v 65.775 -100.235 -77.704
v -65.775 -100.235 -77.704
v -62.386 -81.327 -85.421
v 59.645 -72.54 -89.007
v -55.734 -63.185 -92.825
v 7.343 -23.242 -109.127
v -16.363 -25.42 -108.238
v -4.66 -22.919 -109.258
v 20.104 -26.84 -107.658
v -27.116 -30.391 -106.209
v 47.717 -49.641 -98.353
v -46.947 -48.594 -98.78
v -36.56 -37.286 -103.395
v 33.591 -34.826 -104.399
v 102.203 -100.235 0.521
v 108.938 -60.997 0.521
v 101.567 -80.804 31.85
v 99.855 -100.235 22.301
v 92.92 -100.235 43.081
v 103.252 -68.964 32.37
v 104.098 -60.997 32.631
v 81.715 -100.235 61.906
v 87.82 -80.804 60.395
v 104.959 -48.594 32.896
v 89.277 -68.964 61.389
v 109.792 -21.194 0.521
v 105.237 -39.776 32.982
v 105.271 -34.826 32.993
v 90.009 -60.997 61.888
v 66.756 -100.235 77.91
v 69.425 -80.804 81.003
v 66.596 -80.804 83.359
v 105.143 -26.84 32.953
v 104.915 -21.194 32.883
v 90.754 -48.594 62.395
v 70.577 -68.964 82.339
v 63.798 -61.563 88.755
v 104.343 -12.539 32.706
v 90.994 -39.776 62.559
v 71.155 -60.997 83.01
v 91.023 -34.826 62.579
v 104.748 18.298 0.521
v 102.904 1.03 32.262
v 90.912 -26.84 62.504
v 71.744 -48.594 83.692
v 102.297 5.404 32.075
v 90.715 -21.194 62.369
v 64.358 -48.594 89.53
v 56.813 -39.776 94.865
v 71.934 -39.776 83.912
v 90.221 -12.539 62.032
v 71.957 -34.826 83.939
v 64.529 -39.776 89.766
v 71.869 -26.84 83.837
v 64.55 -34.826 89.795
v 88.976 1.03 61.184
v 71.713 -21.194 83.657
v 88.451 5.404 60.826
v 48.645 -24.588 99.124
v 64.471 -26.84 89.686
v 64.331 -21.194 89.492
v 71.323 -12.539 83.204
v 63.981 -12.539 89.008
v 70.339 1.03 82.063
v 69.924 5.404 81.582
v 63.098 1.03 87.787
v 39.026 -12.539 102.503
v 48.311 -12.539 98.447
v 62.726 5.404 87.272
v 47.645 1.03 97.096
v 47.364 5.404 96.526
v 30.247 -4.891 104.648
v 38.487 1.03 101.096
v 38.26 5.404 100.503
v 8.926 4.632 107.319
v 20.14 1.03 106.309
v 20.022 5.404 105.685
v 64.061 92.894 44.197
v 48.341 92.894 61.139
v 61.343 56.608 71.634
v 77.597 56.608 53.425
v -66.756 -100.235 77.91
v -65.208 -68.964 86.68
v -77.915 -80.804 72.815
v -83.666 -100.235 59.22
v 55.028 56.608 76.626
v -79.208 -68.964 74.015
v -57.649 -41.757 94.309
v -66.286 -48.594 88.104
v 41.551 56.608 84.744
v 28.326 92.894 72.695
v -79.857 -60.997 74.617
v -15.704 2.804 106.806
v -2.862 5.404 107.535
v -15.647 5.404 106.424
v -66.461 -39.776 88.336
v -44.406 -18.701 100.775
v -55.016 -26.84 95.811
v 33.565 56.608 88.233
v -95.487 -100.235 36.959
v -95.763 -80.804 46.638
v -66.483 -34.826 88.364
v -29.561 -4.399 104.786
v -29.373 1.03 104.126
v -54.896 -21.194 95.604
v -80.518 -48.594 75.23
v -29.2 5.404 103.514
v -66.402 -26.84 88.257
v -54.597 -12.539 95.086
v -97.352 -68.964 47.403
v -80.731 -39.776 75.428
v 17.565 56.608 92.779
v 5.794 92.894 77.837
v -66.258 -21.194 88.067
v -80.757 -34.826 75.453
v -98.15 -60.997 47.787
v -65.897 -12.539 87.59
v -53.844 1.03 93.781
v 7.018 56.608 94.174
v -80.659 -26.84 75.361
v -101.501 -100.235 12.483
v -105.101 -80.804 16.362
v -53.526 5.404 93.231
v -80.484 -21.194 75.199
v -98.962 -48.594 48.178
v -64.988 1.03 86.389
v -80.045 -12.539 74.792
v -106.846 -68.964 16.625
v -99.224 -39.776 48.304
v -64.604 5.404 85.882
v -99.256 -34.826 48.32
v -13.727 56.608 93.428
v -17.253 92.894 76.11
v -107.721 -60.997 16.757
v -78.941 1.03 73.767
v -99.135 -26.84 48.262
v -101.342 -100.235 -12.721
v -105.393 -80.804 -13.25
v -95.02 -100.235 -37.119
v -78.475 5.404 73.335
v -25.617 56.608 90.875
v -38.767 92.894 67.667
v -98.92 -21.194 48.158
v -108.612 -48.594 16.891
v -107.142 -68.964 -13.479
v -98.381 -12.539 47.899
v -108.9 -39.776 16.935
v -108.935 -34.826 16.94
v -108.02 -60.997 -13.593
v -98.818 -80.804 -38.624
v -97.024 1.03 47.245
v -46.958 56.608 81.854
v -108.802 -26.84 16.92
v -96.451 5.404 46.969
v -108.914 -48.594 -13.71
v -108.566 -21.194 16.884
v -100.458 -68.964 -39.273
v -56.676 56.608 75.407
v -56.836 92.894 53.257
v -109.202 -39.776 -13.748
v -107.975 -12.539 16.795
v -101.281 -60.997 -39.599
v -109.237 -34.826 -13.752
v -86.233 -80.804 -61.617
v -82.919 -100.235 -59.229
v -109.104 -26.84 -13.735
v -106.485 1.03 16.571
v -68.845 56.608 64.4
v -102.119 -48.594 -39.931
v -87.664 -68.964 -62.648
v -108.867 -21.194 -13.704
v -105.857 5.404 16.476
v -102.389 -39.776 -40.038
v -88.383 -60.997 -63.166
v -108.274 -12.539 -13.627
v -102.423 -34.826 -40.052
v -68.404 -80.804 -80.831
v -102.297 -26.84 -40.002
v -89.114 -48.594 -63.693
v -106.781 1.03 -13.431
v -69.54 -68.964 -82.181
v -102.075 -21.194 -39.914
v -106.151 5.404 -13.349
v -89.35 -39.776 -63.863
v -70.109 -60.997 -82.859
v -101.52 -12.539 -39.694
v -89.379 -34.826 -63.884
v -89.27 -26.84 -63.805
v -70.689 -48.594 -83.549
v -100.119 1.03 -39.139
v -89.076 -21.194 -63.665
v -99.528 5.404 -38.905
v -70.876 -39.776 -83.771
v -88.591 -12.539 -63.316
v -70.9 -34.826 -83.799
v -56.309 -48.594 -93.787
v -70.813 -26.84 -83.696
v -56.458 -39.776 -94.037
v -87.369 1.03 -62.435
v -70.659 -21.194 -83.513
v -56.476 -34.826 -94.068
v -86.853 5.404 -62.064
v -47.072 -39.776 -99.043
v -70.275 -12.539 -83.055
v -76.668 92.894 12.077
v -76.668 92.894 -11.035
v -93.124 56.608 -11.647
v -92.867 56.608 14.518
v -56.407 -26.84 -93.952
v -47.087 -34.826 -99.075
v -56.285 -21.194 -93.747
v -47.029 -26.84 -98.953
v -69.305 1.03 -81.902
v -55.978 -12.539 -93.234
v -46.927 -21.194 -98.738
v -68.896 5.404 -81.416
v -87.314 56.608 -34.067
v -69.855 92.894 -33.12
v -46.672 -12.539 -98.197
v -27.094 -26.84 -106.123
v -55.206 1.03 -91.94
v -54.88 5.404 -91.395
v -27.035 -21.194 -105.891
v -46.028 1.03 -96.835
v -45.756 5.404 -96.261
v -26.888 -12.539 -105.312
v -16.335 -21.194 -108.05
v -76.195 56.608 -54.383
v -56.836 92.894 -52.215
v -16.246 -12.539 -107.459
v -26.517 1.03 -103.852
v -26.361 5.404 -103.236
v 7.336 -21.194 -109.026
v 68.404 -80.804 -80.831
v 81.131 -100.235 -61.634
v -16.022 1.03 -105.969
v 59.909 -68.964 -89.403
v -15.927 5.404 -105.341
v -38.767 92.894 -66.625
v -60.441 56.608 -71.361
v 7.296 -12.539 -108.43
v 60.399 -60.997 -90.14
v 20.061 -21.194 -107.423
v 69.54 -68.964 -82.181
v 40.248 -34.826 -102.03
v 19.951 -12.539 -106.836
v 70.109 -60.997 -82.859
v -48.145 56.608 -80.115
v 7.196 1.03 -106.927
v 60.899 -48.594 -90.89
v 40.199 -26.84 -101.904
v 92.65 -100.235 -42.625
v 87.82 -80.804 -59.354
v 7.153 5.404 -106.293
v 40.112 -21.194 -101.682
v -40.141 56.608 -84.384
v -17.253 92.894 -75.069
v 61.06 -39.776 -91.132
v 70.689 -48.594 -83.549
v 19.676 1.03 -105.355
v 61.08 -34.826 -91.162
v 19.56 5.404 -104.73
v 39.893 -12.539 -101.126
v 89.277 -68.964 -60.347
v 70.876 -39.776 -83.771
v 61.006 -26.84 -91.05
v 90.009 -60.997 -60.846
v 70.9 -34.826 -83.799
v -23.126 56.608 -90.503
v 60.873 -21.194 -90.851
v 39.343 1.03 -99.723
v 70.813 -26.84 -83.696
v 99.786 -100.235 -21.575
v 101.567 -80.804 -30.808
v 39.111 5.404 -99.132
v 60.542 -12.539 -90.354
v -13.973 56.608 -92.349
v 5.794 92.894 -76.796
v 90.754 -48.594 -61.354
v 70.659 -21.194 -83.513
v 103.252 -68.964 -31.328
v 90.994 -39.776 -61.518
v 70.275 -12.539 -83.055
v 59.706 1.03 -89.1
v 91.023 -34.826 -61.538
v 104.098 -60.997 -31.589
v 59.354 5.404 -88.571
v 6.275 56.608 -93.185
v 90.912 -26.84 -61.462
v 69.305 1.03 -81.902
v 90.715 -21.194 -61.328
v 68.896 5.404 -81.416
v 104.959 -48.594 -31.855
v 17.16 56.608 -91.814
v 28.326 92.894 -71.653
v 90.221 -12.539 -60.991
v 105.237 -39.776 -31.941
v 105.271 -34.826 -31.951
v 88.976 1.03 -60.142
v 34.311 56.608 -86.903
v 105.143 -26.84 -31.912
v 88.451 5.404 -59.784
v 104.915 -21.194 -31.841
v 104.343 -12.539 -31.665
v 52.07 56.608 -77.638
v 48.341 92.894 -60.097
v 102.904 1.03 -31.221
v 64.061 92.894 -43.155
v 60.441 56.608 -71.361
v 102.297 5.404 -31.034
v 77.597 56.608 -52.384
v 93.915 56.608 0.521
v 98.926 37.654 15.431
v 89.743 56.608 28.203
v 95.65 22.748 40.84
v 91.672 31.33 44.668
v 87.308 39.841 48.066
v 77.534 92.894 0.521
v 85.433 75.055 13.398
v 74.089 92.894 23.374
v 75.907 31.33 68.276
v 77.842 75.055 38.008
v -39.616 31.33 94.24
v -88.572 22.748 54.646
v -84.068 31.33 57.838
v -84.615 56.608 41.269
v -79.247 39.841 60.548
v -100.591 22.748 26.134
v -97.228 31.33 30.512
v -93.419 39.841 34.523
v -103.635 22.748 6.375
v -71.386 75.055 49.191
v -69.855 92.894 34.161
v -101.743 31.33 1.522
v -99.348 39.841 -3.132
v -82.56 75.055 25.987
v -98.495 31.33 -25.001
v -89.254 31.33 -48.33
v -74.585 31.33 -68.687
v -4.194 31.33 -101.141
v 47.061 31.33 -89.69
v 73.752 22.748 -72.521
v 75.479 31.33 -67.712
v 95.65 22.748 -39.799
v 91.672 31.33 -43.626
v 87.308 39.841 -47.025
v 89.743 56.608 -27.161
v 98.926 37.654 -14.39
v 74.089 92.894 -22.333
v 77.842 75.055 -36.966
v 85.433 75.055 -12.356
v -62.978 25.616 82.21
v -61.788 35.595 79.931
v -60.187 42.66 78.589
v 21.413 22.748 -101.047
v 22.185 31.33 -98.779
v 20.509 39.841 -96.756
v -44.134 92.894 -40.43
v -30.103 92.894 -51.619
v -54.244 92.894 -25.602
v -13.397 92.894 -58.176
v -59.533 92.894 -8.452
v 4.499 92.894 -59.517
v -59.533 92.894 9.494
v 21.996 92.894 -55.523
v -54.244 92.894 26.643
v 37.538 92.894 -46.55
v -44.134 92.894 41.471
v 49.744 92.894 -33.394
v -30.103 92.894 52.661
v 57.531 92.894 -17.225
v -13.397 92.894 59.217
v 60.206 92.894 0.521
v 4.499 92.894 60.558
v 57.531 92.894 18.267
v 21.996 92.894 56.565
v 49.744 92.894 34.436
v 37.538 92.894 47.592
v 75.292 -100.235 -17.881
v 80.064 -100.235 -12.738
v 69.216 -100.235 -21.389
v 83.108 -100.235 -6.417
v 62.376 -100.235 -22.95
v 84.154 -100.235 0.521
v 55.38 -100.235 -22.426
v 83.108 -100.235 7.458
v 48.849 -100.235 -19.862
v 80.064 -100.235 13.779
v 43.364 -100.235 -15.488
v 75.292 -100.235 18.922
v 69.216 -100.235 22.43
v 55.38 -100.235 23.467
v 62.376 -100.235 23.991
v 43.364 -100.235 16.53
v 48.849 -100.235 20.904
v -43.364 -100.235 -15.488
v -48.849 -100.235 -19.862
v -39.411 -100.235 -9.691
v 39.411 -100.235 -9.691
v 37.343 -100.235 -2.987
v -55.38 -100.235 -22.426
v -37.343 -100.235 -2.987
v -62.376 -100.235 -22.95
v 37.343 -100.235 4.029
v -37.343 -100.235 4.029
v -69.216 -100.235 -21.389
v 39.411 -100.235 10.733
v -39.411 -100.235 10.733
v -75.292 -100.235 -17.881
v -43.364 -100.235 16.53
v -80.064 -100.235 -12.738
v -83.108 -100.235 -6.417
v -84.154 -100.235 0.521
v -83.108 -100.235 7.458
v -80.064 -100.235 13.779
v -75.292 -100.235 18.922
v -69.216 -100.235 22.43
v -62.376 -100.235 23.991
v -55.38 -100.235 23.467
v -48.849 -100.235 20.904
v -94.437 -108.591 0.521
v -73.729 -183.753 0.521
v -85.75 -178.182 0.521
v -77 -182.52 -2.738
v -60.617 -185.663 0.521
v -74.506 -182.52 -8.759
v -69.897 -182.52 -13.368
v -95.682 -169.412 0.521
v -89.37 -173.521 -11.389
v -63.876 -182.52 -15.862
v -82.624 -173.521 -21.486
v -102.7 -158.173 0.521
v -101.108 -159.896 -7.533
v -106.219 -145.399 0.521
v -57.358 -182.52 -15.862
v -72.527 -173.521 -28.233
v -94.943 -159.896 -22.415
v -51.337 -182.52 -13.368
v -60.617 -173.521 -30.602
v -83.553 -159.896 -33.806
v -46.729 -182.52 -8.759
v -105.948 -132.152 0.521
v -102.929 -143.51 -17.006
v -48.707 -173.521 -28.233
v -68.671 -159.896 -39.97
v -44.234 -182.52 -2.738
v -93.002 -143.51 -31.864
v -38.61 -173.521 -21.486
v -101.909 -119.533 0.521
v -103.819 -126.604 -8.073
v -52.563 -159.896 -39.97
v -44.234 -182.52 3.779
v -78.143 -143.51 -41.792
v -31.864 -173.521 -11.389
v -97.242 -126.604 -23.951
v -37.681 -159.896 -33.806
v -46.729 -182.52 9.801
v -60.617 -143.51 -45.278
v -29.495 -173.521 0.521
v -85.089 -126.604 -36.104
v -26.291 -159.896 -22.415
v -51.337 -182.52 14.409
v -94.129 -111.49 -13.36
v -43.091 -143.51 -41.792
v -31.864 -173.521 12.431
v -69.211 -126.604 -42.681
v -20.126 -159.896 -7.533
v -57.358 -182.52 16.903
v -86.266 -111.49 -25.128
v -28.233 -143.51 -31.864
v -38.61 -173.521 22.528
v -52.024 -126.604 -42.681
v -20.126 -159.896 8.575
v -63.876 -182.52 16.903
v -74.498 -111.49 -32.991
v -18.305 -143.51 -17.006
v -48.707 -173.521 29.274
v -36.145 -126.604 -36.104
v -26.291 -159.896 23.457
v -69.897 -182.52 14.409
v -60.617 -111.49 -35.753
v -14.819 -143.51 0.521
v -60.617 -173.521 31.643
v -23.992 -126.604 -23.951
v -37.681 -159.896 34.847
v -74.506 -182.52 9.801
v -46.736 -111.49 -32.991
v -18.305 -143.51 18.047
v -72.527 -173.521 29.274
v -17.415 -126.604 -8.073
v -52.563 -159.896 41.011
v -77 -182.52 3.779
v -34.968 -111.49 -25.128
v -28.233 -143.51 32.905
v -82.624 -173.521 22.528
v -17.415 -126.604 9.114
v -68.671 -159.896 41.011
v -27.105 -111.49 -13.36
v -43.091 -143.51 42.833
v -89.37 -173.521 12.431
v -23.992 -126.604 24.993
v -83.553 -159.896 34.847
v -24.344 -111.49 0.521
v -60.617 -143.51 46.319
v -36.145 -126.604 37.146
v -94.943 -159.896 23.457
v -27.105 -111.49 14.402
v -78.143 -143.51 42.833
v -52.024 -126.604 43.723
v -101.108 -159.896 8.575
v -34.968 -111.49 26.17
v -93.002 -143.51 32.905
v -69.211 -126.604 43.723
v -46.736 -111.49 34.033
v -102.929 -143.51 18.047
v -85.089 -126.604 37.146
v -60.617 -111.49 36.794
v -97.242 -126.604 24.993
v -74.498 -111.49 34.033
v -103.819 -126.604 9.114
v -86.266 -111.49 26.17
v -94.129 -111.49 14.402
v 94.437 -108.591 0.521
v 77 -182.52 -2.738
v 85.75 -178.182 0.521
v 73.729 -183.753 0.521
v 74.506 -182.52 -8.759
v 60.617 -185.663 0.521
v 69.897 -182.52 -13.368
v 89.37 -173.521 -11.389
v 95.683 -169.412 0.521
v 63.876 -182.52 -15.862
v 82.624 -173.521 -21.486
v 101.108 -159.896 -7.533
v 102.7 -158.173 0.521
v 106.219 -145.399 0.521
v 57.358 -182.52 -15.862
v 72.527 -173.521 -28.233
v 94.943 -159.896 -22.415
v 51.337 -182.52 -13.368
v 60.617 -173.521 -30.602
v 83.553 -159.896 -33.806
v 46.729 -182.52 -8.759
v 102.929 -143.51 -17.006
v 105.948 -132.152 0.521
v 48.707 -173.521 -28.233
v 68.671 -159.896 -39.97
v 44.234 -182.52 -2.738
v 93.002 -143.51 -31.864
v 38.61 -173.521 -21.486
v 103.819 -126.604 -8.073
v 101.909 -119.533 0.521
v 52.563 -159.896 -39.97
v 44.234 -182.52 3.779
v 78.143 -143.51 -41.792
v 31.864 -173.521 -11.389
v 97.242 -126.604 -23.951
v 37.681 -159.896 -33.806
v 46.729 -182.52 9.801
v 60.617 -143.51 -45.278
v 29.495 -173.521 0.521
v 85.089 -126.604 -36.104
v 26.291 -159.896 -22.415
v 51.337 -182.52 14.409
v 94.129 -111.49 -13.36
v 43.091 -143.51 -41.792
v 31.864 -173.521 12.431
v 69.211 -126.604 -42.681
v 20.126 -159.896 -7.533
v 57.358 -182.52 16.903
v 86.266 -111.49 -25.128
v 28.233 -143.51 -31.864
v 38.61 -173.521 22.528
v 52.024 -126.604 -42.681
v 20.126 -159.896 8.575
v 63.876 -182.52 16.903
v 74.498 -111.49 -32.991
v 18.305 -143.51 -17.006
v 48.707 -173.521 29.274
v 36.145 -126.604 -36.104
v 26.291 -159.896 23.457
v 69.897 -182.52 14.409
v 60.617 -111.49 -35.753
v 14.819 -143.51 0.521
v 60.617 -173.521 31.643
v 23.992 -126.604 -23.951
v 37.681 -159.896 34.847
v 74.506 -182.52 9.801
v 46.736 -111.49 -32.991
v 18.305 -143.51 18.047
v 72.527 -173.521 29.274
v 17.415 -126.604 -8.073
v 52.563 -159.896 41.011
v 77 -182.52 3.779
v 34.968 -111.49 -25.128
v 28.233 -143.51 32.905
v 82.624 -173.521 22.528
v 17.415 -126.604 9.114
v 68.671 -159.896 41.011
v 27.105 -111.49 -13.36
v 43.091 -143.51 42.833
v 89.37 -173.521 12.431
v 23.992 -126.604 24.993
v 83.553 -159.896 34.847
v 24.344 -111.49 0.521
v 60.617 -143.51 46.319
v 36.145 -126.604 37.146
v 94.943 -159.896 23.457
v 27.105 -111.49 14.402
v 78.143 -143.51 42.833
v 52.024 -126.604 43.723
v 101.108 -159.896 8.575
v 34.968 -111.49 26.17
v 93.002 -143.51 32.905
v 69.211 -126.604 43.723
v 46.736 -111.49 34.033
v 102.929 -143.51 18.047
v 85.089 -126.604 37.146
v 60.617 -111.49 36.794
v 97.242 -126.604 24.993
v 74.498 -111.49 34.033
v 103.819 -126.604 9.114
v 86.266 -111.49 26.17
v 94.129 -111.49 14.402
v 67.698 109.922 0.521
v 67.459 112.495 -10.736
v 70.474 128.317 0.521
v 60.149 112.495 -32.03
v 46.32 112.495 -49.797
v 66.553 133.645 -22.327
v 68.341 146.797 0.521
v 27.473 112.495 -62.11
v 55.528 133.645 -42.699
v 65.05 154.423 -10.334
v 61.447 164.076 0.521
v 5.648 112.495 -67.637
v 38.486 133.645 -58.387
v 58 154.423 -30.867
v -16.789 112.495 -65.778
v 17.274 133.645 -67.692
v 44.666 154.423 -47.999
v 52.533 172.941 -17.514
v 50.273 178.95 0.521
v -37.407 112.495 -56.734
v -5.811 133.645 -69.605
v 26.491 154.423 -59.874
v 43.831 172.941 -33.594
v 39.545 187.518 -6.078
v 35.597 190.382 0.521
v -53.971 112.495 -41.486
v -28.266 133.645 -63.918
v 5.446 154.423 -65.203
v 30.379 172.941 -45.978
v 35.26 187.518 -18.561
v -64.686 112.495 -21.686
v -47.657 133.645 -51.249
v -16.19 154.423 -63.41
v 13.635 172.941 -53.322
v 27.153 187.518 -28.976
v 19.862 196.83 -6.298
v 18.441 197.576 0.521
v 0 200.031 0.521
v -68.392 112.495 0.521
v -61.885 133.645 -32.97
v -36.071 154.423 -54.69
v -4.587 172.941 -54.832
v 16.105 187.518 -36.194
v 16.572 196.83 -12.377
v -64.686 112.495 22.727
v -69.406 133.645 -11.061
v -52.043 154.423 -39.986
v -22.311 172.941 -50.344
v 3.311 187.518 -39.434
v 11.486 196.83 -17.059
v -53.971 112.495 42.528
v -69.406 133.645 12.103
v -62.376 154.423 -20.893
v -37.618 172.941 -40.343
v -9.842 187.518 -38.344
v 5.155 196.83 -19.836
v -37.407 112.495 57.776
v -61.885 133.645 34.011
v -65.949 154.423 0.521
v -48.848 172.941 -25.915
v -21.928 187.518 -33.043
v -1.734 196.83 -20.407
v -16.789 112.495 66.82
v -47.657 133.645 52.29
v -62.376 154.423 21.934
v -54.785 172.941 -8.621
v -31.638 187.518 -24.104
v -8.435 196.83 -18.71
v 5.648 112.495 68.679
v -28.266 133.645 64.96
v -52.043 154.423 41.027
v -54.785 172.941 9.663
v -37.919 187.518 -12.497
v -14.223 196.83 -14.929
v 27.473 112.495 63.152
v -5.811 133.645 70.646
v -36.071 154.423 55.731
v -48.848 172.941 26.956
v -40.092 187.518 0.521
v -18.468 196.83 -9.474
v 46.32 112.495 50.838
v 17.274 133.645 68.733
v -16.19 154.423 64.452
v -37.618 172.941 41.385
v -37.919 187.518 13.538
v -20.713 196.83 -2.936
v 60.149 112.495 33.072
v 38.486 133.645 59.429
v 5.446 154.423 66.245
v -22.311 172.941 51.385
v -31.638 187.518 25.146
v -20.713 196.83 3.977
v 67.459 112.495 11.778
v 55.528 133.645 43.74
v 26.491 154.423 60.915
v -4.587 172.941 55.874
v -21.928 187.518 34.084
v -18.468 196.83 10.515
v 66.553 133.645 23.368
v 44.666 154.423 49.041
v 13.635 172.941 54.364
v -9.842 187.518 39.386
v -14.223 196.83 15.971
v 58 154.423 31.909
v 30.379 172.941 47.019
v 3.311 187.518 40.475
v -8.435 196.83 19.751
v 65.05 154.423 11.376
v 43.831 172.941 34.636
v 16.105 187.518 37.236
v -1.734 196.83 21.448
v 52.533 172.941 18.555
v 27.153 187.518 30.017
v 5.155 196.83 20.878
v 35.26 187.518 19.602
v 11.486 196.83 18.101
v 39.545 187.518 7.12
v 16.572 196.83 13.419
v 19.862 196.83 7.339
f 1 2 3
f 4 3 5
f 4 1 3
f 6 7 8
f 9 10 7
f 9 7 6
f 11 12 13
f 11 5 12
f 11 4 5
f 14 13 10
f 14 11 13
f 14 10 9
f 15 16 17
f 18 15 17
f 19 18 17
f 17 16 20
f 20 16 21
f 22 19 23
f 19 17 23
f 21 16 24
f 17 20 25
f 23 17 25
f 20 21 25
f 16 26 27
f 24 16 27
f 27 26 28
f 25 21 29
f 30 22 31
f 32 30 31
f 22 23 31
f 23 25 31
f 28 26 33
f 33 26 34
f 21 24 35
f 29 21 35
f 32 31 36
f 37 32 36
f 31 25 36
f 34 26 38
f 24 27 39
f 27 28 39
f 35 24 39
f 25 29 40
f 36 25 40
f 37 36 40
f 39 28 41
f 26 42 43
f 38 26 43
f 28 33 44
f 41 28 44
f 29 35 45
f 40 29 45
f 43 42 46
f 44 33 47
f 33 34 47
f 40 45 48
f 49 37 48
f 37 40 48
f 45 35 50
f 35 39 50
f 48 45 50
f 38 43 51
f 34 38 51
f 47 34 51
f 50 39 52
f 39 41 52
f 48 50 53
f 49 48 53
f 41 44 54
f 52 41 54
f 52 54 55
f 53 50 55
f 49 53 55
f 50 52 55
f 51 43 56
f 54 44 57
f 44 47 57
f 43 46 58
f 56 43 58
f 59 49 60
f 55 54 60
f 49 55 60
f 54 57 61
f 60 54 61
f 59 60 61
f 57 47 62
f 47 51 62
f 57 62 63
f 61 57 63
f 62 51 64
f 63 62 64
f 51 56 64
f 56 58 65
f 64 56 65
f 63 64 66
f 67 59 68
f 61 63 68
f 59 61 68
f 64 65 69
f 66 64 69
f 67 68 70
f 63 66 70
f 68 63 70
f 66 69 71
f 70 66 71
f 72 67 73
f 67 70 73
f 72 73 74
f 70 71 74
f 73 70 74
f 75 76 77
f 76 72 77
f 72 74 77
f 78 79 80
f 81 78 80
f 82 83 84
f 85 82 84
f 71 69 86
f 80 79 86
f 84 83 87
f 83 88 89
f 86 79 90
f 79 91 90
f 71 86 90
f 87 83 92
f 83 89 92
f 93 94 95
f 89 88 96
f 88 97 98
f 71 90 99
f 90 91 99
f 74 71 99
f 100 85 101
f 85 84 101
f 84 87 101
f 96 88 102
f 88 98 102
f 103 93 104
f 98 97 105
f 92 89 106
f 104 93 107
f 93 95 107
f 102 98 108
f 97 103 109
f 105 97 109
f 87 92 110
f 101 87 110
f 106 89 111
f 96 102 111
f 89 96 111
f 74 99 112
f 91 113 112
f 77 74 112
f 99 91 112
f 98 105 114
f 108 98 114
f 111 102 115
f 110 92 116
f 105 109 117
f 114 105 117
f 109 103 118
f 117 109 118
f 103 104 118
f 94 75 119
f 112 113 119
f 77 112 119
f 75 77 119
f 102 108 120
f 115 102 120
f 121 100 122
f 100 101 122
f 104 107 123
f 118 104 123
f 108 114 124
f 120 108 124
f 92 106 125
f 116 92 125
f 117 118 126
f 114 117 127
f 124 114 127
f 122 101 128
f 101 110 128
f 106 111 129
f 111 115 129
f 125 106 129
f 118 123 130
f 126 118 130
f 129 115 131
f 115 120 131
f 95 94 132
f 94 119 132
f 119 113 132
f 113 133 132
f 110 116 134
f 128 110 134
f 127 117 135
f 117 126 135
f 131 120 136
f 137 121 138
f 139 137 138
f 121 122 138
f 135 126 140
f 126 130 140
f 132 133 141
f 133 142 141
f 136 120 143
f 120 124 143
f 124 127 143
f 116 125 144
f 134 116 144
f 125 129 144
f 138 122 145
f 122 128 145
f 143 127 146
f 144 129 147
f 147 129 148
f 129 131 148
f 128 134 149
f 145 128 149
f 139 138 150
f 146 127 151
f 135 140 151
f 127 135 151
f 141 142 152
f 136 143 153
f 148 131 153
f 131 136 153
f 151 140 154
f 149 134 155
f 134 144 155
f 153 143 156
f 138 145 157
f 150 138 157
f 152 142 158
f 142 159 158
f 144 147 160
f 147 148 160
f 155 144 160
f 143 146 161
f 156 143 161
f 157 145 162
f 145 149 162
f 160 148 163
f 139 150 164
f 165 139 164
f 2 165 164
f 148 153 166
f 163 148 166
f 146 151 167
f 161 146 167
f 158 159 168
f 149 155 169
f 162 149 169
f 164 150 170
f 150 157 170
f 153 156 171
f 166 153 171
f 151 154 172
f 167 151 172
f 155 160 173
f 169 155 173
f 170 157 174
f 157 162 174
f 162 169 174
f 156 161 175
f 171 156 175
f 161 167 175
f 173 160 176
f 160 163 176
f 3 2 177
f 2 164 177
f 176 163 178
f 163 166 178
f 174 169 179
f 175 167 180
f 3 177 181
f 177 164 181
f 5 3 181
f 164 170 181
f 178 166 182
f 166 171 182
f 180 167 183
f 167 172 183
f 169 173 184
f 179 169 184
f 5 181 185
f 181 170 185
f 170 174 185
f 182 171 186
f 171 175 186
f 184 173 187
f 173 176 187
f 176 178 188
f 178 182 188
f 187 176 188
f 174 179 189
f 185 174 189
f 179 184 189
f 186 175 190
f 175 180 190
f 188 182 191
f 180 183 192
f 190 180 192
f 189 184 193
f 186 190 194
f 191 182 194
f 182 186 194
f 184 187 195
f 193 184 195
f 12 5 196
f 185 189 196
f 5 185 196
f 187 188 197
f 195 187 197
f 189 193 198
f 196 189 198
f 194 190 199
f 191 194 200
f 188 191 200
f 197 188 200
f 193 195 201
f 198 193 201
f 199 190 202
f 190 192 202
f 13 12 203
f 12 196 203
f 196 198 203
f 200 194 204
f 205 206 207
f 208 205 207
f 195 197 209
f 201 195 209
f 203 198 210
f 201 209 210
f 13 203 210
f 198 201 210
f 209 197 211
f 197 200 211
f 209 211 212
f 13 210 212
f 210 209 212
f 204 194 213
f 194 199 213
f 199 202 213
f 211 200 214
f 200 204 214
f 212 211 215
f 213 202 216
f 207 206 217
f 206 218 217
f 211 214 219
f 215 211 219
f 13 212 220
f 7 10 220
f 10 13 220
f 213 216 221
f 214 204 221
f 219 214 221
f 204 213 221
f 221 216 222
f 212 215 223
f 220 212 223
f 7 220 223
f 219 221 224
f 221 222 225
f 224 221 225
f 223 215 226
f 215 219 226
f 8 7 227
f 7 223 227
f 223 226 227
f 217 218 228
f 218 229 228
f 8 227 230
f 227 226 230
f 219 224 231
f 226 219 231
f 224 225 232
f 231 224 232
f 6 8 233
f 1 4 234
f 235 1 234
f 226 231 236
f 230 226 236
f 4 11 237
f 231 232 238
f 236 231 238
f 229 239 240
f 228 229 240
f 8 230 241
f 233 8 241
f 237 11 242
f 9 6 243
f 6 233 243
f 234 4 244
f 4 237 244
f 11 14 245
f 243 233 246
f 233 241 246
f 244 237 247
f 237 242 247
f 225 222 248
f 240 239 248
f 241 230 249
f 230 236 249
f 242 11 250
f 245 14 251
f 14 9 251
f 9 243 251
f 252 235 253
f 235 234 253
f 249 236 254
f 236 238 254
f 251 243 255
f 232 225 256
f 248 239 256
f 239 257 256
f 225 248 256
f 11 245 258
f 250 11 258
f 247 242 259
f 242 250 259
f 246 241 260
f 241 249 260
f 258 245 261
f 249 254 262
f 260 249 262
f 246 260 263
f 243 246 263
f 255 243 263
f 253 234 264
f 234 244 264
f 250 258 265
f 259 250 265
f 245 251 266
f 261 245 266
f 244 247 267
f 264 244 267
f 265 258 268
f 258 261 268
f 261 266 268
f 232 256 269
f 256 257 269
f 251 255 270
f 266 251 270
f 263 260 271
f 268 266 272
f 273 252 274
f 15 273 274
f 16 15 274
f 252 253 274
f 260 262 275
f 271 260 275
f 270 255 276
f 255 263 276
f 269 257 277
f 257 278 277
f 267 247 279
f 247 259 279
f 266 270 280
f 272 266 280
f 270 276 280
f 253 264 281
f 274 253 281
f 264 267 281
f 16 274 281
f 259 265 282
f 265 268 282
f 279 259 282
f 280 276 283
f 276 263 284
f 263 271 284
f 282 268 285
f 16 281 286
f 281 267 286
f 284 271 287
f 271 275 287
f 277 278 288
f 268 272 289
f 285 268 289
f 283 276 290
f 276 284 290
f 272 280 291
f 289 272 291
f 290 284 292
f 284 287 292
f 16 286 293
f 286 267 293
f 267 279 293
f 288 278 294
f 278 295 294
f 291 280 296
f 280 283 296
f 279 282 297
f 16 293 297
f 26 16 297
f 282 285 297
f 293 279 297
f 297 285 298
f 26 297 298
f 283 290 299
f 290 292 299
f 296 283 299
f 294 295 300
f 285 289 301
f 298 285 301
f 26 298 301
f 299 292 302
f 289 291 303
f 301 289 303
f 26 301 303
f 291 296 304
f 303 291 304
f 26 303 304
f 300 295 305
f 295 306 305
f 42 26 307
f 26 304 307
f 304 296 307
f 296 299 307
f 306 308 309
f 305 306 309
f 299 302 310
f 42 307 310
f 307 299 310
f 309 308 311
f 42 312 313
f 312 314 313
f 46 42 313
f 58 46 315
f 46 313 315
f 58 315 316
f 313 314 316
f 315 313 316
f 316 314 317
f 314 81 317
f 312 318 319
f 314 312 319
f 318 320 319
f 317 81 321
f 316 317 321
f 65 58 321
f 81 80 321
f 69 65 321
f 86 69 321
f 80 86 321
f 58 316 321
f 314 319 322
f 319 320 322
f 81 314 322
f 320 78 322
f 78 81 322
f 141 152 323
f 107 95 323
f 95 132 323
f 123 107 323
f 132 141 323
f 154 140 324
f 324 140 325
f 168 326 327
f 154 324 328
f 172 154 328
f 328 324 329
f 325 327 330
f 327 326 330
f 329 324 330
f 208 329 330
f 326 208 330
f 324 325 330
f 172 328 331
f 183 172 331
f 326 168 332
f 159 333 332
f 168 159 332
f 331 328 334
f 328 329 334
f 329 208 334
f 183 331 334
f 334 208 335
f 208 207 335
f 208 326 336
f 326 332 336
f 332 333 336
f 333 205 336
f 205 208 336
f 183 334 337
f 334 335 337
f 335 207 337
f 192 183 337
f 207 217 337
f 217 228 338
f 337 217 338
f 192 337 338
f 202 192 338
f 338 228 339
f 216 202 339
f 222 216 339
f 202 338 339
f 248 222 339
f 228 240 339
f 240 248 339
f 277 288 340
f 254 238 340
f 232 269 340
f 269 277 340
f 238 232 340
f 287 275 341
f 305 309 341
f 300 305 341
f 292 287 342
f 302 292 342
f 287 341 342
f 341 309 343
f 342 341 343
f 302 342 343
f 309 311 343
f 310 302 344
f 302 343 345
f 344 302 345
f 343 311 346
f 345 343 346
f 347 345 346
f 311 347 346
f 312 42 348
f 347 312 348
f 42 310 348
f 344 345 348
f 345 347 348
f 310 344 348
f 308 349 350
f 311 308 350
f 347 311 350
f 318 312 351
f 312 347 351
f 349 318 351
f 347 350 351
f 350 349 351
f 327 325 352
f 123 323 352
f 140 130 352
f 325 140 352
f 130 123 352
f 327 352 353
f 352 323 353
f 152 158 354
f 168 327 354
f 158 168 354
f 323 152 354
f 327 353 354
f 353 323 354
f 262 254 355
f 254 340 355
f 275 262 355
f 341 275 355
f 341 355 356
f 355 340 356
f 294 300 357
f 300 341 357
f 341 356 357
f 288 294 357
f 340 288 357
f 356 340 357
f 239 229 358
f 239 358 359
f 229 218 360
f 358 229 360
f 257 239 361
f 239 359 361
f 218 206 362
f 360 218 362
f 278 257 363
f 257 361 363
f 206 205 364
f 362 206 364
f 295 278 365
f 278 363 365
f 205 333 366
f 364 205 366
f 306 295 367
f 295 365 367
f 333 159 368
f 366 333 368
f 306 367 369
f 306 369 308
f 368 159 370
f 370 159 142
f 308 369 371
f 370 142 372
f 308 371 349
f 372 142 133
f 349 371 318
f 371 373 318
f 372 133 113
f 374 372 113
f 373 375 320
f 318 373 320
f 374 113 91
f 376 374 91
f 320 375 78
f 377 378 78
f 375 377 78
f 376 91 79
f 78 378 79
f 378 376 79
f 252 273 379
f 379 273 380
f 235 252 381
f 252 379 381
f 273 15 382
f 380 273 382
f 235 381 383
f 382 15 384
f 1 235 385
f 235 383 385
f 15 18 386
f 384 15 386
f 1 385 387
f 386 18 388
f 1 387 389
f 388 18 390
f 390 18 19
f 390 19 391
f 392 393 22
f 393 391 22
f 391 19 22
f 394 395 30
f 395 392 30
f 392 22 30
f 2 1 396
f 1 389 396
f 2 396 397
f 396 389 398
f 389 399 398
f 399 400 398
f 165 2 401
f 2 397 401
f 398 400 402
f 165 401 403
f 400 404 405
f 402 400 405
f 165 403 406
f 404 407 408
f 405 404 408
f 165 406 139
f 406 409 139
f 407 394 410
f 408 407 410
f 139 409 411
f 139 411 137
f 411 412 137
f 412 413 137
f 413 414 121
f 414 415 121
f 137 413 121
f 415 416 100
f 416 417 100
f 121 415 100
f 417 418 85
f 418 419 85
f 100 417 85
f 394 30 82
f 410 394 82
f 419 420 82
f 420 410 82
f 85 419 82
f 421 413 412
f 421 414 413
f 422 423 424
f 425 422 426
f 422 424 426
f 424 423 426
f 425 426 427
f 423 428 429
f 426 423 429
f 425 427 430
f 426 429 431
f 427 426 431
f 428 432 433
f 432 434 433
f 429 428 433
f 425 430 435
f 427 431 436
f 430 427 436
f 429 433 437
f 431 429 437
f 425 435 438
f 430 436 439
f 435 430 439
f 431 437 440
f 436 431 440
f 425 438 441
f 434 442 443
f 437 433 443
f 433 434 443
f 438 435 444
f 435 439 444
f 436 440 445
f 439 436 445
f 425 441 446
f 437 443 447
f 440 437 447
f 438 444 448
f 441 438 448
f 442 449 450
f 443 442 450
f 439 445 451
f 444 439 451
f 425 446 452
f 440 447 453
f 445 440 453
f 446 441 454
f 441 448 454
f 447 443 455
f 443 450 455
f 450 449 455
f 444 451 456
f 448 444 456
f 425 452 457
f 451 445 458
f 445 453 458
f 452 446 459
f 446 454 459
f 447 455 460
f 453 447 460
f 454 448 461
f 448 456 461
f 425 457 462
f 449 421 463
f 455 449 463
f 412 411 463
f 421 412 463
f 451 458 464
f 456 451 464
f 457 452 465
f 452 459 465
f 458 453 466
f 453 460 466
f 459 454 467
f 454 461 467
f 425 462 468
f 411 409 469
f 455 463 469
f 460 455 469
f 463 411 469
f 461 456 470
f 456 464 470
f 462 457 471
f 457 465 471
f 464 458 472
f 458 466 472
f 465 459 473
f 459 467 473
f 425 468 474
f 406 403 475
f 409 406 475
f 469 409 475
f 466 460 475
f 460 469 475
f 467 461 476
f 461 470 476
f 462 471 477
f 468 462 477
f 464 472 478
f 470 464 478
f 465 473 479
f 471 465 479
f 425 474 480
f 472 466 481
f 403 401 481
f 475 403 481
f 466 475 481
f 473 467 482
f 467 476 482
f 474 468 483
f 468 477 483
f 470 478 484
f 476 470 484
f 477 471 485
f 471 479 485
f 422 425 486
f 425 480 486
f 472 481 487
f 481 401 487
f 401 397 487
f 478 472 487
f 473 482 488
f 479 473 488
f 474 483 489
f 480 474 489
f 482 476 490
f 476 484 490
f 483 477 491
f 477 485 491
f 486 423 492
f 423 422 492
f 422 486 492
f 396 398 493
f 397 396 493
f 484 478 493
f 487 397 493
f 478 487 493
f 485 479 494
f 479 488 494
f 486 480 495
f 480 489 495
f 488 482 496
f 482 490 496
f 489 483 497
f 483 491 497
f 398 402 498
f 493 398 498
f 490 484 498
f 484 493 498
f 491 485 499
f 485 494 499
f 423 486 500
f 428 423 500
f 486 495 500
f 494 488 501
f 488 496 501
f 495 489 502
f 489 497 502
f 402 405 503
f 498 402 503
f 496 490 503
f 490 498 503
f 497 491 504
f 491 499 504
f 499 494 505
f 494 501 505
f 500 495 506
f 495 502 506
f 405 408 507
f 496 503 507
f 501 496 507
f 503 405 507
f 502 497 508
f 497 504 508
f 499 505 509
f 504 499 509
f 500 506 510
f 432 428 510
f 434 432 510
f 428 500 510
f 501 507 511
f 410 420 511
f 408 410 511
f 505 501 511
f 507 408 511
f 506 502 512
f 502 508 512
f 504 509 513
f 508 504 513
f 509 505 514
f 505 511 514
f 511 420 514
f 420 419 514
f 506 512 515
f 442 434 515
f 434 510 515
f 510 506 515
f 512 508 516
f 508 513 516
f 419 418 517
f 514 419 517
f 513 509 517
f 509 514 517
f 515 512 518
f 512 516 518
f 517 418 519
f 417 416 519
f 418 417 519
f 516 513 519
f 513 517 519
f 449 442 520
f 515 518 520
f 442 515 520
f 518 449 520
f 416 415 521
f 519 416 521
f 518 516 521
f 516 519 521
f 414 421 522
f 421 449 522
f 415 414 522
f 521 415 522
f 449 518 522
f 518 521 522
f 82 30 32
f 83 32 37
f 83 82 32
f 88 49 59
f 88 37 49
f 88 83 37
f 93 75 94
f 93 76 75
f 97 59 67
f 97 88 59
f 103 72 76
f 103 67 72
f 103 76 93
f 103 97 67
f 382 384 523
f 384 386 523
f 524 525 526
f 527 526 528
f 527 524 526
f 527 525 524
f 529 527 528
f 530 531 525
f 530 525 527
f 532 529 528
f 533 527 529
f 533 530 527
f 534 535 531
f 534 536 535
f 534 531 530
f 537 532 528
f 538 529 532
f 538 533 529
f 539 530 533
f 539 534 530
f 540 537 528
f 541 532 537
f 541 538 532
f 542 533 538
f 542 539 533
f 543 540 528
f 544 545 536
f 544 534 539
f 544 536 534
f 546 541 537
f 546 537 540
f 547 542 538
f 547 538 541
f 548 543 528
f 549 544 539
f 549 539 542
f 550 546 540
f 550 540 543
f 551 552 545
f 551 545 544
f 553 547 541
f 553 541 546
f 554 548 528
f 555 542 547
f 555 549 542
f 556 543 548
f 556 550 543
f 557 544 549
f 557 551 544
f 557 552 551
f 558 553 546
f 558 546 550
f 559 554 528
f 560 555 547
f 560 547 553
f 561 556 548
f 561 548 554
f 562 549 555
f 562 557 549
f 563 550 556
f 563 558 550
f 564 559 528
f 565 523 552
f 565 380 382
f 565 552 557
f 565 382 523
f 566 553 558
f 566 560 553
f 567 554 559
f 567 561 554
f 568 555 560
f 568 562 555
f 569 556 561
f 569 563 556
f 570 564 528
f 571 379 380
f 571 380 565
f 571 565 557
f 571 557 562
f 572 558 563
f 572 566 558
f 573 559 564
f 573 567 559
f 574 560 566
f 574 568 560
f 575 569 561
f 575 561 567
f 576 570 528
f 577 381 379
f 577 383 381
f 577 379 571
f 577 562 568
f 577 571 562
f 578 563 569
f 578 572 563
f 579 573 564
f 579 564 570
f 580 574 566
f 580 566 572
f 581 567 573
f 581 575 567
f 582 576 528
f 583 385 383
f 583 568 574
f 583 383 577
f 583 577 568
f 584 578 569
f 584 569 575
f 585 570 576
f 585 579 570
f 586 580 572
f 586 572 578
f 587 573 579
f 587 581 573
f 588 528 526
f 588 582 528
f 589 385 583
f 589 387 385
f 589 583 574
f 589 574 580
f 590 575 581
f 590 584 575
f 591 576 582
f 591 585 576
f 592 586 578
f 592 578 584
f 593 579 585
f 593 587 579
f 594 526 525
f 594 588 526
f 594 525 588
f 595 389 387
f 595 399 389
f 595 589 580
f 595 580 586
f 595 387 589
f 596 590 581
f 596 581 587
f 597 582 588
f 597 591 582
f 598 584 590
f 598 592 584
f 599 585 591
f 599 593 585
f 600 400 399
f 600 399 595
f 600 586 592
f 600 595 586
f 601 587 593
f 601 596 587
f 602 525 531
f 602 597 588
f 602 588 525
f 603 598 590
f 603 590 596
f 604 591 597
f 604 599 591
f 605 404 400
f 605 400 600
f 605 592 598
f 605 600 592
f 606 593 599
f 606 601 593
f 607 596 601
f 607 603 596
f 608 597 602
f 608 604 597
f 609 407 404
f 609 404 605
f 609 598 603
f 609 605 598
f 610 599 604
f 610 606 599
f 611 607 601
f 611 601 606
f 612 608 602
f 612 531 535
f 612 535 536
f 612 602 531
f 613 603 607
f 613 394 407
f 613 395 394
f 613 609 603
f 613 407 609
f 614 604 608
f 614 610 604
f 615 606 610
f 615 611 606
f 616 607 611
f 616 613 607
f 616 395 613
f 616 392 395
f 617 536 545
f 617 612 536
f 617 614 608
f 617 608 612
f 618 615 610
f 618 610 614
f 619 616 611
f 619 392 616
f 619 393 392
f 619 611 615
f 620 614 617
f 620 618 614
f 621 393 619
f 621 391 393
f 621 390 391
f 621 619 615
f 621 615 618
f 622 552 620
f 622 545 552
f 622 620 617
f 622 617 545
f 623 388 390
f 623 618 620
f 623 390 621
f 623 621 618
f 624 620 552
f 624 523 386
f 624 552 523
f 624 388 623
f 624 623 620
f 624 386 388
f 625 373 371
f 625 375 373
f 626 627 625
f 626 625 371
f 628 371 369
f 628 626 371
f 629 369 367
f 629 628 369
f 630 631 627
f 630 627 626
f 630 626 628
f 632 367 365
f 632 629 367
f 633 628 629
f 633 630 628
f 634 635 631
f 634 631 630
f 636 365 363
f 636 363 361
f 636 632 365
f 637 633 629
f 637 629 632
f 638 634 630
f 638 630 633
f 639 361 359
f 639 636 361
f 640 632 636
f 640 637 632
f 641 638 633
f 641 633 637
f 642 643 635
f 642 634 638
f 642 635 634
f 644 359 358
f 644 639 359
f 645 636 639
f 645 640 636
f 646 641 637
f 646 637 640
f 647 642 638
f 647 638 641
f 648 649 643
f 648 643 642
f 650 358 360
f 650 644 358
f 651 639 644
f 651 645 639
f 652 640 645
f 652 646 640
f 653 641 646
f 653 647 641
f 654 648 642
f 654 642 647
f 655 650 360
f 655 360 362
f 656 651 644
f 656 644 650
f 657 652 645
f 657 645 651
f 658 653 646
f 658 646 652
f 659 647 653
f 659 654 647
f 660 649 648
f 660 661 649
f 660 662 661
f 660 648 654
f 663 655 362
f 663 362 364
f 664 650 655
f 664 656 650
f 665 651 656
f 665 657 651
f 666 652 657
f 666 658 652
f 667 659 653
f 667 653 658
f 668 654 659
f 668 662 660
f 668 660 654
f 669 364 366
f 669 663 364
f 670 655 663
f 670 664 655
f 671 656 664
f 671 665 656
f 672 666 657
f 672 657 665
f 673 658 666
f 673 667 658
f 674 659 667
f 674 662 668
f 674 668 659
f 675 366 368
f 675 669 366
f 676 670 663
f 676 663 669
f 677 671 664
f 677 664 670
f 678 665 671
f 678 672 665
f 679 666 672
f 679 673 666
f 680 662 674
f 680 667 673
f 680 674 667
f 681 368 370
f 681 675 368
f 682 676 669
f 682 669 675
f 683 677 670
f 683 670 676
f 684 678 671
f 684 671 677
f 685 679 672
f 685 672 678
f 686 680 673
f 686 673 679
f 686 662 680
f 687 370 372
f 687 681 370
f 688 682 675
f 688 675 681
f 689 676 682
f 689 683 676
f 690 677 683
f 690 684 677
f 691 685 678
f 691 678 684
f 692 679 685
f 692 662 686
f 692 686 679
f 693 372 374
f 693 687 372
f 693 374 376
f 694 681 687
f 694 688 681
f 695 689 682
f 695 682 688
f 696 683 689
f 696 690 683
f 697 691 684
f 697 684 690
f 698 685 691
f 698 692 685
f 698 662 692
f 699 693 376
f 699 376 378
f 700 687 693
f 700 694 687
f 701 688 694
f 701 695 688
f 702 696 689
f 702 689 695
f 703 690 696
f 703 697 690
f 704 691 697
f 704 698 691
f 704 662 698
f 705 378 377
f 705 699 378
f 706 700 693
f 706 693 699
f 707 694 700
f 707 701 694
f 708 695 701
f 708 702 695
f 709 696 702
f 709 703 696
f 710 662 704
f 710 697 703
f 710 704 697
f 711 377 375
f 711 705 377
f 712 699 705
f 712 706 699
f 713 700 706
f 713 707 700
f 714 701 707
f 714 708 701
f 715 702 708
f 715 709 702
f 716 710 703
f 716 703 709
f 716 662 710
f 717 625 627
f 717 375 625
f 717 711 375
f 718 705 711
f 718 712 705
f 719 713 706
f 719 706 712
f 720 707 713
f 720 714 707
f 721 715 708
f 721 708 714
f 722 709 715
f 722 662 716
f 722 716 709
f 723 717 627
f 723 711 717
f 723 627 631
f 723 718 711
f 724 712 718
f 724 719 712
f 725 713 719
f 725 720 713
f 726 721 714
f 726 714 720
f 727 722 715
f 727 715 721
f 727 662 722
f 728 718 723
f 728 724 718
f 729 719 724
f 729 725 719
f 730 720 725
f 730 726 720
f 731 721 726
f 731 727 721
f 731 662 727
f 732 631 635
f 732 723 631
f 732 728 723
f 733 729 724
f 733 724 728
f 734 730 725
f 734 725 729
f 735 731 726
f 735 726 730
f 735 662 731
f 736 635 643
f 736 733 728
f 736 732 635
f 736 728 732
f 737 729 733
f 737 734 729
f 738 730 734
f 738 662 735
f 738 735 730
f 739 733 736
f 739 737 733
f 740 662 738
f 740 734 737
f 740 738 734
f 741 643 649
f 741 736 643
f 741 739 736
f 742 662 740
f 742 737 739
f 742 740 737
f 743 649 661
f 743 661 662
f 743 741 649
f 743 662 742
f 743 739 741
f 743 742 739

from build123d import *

# Parameters (mm, degrees)
CUT_EXTRUDE1_DEPTH = 15.976868681
SCALE1_SCALE       = 5.55


with BuildPart() as part:
    # Sketch1 → Base-Revolve (revolve)
    with BuildSketch(Plane.XY):
        with BuildLine():
            Line((0, 17.399), (0, -17.399))
            Line((0, -17.399), (18.415, -17.399))
            ThreePointArc((18.415, -17.399), (19.460122177, 0.417396993), (13.97, 17.399))
            Line((13.97, 17.399), (0, 17.399))
        make_face()
    revolve(axis=Axis((0, 64.099865047, 0), (0, -1, 0)))

    # Sketch2 → Cut-Extrude1 (cut, symmetric)
    with BuildSketch(Plane(origin=(0, 0, 0), x_dir=(0, 0, -1), z_dir=(1, 0, 0))):
        Polygon((-13.944000247, -17.399), (-19.286363897, 1.651), (-22.841821799, 1.651), (-22.841821799, -17.894237605), (-13.944000247, -17.894237605), align=None)
        Polygon((19.796019511, -3.429), (22.737840025, -3.429), (22.737840025, -17.894237605), (14.094585635, -17.894237605), (14.094585635, -17.399), align=None)
    extrude(amount=CUT_EXTRUDE1_DEPTH, both=True, mode=Mode.SUBTRACT)

    # Sketch3 → Boss-Revolve1 (revolve)
    with BuildSketch(Plane.XY):
        with BuildLine():
            Line((0, 36.703), (0, 11.303))
            ThreePointArc((0, 11.303), (12.7, 24.003), (0, 36.703))
        make_face()
    revolve(axis=Axis((0, 0, 0), (0, 1, 0)))

    # Sketch5 → Boss-Revolve2 (revolve)
    with BuildSketch(Plane.XY):
        with BuildLine():
            Line((10.922, -16.2306), (10.922, -32.7914))
            ThreePointArc((10.922, -32.7914), (19.2024, -24.511), (10.922, -16.2306))
        make_face()
    boss_revolve2 = revolve(axis=Axis((10.922, -36.241550195, 0), (0, 1, 0)))

    # Mirror1: Boss-Revolve2 across plane
    add(boss_revolve2.mirror(Plane(origin=(0, 0, 0), x_dir=(0, 0, 1), z_dir=(1, 0, 0))))


with BuildPart() as part_1:
    # Scale1: scaled about (-1.79e-07, 0.806776092, -0.114453365)
    add(part.part.scale(SCALE1_SCALE).moved(Location((8.14e-07, -3.670831219, 0.520762811))))


solid = part_1.part
